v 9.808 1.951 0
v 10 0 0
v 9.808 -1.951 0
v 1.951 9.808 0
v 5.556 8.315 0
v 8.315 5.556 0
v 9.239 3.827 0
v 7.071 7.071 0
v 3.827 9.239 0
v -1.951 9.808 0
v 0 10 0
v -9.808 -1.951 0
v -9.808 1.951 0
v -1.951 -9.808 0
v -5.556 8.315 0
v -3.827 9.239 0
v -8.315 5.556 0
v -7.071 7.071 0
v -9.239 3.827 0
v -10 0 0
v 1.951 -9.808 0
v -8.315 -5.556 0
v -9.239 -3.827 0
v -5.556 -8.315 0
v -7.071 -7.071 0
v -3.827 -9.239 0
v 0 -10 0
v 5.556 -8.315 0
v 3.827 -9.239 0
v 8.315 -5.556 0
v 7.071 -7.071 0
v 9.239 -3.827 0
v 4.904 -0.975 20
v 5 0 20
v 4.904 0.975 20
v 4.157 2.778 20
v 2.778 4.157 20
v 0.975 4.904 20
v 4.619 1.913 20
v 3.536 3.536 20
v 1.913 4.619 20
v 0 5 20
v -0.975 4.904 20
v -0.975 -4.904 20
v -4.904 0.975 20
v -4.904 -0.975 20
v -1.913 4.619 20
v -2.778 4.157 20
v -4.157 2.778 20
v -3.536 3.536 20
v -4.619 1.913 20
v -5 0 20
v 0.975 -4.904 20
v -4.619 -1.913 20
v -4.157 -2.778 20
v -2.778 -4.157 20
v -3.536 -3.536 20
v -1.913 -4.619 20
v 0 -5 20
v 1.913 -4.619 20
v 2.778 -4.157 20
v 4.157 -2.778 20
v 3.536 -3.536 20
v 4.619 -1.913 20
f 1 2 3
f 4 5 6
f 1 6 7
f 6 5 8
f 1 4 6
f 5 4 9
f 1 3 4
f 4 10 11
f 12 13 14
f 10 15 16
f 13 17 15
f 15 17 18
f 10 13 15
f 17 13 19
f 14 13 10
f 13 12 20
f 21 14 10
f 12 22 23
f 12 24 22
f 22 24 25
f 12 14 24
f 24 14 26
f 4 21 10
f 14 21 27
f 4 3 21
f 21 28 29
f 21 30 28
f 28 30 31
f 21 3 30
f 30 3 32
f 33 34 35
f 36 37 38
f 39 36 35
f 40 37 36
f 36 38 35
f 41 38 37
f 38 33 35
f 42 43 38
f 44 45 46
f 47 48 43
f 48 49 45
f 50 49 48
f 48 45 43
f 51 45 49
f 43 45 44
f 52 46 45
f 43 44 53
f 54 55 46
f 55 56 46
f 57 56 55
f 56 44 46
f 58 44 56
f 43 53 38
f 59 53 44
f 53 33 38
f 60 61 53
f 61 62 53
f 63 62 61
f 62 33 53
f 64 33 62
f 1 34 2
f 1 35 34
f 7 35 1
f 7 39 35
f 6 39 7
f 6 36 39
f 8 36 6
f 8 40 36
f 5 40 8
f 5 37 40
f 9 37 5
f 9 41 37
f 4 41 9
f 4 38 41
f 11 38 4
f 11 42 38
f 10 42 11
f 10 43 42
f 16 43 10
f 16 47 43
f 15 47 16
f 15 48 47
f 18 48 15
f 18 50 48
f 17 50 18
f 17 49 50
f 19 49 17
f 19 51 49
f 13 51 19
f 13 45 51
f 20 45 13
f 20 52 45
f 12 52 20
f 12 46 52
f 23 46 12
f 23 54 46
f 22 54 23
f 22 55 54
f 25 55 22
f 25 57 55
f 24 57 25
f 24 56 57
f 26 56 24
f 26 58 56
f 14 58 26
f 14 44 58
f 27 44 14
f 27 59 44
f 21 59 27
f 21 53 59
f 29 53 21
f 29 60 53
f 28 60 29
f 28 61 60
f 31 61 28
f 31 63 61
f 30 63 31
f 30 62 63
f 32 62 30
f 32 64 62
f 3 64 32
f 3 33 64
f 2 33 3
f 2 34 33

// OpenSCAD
// A tapered extrusion of a circle, which sweeps a cone.
//
// The taper idiom - a draft angle, a lead-in, a tapered boss - is as common as
// the straight one, and it was the case that showed the arc channel needed to
// know what `scale` does rather than only whether it was uniform. Declaring the
// circle's radius alone says "cylinder r=10" of a body that is a frustum: the
// fit rejects it, so the export stayed correct and stayed faceted, and the
// report said neither "nothing was declared" nor "something was recognised".
//
// Since 2026-09-25 the extrusion declares the cone itself, as a face, and the
// circle at each of its two ends as evidence - the way rotate_extrude has
// declared a sloped edge's cone since 2026-09-24, and cylinder(r1, r2) always
// has. Until then it declared the two circles alone, the band pass recognised
// the frustum from them, and every facet was held on the tessellation's
// evidence (D3) though the model stated the surface exactly. It is what the
// sweep gives: every station of an even taper is a similarity, so the circle
// stays a circle, its centre travels along the normal, and its radius changes
// linearly - the right cone through its two end circles. So this comes out
// identical to cylinder(h=20, r1=10, r2=5) - three faces, one CONICAL_SURFACE -
// which is the point, since the two are the same solid written two ways.
//
// An off-centre arc under a taper is refused by the same fact, not a rule of
// its own: `scale` is taken about the profile origin, so such an arc's centre
// slides sideways as it shrinks, travels off the normal, and sweeps an
// *oblique* cone - exact, describable, and not a CONICAL_SURFACE.
//
// EXPECT: 3 analytic surfaces available (2 cylindrical, 0 spherical, 0 toroidal, 0 Bezier, 1 conical)
// EXPECT: 1 surface recognised (0 toroidal, 0 spherical, 1 conical, 0 partial), 32 facets replaced
// EXPECT: what decided each written facet: 32 D0, 0 D1, 0 D2, 0 D3, 0 D4
//
// scale=0.5 on r=10 over h=20 is the frustum r1=10, r2=5:
// (pi*20/3)(100 + 50 + 25).
// ROUNDTRIP: Cone=1 Plane=2
// VOLUME: 3665.1914292
$fn = 32;
linear_extrude(height = 20, scale = 0.5) circle(r = 10);
